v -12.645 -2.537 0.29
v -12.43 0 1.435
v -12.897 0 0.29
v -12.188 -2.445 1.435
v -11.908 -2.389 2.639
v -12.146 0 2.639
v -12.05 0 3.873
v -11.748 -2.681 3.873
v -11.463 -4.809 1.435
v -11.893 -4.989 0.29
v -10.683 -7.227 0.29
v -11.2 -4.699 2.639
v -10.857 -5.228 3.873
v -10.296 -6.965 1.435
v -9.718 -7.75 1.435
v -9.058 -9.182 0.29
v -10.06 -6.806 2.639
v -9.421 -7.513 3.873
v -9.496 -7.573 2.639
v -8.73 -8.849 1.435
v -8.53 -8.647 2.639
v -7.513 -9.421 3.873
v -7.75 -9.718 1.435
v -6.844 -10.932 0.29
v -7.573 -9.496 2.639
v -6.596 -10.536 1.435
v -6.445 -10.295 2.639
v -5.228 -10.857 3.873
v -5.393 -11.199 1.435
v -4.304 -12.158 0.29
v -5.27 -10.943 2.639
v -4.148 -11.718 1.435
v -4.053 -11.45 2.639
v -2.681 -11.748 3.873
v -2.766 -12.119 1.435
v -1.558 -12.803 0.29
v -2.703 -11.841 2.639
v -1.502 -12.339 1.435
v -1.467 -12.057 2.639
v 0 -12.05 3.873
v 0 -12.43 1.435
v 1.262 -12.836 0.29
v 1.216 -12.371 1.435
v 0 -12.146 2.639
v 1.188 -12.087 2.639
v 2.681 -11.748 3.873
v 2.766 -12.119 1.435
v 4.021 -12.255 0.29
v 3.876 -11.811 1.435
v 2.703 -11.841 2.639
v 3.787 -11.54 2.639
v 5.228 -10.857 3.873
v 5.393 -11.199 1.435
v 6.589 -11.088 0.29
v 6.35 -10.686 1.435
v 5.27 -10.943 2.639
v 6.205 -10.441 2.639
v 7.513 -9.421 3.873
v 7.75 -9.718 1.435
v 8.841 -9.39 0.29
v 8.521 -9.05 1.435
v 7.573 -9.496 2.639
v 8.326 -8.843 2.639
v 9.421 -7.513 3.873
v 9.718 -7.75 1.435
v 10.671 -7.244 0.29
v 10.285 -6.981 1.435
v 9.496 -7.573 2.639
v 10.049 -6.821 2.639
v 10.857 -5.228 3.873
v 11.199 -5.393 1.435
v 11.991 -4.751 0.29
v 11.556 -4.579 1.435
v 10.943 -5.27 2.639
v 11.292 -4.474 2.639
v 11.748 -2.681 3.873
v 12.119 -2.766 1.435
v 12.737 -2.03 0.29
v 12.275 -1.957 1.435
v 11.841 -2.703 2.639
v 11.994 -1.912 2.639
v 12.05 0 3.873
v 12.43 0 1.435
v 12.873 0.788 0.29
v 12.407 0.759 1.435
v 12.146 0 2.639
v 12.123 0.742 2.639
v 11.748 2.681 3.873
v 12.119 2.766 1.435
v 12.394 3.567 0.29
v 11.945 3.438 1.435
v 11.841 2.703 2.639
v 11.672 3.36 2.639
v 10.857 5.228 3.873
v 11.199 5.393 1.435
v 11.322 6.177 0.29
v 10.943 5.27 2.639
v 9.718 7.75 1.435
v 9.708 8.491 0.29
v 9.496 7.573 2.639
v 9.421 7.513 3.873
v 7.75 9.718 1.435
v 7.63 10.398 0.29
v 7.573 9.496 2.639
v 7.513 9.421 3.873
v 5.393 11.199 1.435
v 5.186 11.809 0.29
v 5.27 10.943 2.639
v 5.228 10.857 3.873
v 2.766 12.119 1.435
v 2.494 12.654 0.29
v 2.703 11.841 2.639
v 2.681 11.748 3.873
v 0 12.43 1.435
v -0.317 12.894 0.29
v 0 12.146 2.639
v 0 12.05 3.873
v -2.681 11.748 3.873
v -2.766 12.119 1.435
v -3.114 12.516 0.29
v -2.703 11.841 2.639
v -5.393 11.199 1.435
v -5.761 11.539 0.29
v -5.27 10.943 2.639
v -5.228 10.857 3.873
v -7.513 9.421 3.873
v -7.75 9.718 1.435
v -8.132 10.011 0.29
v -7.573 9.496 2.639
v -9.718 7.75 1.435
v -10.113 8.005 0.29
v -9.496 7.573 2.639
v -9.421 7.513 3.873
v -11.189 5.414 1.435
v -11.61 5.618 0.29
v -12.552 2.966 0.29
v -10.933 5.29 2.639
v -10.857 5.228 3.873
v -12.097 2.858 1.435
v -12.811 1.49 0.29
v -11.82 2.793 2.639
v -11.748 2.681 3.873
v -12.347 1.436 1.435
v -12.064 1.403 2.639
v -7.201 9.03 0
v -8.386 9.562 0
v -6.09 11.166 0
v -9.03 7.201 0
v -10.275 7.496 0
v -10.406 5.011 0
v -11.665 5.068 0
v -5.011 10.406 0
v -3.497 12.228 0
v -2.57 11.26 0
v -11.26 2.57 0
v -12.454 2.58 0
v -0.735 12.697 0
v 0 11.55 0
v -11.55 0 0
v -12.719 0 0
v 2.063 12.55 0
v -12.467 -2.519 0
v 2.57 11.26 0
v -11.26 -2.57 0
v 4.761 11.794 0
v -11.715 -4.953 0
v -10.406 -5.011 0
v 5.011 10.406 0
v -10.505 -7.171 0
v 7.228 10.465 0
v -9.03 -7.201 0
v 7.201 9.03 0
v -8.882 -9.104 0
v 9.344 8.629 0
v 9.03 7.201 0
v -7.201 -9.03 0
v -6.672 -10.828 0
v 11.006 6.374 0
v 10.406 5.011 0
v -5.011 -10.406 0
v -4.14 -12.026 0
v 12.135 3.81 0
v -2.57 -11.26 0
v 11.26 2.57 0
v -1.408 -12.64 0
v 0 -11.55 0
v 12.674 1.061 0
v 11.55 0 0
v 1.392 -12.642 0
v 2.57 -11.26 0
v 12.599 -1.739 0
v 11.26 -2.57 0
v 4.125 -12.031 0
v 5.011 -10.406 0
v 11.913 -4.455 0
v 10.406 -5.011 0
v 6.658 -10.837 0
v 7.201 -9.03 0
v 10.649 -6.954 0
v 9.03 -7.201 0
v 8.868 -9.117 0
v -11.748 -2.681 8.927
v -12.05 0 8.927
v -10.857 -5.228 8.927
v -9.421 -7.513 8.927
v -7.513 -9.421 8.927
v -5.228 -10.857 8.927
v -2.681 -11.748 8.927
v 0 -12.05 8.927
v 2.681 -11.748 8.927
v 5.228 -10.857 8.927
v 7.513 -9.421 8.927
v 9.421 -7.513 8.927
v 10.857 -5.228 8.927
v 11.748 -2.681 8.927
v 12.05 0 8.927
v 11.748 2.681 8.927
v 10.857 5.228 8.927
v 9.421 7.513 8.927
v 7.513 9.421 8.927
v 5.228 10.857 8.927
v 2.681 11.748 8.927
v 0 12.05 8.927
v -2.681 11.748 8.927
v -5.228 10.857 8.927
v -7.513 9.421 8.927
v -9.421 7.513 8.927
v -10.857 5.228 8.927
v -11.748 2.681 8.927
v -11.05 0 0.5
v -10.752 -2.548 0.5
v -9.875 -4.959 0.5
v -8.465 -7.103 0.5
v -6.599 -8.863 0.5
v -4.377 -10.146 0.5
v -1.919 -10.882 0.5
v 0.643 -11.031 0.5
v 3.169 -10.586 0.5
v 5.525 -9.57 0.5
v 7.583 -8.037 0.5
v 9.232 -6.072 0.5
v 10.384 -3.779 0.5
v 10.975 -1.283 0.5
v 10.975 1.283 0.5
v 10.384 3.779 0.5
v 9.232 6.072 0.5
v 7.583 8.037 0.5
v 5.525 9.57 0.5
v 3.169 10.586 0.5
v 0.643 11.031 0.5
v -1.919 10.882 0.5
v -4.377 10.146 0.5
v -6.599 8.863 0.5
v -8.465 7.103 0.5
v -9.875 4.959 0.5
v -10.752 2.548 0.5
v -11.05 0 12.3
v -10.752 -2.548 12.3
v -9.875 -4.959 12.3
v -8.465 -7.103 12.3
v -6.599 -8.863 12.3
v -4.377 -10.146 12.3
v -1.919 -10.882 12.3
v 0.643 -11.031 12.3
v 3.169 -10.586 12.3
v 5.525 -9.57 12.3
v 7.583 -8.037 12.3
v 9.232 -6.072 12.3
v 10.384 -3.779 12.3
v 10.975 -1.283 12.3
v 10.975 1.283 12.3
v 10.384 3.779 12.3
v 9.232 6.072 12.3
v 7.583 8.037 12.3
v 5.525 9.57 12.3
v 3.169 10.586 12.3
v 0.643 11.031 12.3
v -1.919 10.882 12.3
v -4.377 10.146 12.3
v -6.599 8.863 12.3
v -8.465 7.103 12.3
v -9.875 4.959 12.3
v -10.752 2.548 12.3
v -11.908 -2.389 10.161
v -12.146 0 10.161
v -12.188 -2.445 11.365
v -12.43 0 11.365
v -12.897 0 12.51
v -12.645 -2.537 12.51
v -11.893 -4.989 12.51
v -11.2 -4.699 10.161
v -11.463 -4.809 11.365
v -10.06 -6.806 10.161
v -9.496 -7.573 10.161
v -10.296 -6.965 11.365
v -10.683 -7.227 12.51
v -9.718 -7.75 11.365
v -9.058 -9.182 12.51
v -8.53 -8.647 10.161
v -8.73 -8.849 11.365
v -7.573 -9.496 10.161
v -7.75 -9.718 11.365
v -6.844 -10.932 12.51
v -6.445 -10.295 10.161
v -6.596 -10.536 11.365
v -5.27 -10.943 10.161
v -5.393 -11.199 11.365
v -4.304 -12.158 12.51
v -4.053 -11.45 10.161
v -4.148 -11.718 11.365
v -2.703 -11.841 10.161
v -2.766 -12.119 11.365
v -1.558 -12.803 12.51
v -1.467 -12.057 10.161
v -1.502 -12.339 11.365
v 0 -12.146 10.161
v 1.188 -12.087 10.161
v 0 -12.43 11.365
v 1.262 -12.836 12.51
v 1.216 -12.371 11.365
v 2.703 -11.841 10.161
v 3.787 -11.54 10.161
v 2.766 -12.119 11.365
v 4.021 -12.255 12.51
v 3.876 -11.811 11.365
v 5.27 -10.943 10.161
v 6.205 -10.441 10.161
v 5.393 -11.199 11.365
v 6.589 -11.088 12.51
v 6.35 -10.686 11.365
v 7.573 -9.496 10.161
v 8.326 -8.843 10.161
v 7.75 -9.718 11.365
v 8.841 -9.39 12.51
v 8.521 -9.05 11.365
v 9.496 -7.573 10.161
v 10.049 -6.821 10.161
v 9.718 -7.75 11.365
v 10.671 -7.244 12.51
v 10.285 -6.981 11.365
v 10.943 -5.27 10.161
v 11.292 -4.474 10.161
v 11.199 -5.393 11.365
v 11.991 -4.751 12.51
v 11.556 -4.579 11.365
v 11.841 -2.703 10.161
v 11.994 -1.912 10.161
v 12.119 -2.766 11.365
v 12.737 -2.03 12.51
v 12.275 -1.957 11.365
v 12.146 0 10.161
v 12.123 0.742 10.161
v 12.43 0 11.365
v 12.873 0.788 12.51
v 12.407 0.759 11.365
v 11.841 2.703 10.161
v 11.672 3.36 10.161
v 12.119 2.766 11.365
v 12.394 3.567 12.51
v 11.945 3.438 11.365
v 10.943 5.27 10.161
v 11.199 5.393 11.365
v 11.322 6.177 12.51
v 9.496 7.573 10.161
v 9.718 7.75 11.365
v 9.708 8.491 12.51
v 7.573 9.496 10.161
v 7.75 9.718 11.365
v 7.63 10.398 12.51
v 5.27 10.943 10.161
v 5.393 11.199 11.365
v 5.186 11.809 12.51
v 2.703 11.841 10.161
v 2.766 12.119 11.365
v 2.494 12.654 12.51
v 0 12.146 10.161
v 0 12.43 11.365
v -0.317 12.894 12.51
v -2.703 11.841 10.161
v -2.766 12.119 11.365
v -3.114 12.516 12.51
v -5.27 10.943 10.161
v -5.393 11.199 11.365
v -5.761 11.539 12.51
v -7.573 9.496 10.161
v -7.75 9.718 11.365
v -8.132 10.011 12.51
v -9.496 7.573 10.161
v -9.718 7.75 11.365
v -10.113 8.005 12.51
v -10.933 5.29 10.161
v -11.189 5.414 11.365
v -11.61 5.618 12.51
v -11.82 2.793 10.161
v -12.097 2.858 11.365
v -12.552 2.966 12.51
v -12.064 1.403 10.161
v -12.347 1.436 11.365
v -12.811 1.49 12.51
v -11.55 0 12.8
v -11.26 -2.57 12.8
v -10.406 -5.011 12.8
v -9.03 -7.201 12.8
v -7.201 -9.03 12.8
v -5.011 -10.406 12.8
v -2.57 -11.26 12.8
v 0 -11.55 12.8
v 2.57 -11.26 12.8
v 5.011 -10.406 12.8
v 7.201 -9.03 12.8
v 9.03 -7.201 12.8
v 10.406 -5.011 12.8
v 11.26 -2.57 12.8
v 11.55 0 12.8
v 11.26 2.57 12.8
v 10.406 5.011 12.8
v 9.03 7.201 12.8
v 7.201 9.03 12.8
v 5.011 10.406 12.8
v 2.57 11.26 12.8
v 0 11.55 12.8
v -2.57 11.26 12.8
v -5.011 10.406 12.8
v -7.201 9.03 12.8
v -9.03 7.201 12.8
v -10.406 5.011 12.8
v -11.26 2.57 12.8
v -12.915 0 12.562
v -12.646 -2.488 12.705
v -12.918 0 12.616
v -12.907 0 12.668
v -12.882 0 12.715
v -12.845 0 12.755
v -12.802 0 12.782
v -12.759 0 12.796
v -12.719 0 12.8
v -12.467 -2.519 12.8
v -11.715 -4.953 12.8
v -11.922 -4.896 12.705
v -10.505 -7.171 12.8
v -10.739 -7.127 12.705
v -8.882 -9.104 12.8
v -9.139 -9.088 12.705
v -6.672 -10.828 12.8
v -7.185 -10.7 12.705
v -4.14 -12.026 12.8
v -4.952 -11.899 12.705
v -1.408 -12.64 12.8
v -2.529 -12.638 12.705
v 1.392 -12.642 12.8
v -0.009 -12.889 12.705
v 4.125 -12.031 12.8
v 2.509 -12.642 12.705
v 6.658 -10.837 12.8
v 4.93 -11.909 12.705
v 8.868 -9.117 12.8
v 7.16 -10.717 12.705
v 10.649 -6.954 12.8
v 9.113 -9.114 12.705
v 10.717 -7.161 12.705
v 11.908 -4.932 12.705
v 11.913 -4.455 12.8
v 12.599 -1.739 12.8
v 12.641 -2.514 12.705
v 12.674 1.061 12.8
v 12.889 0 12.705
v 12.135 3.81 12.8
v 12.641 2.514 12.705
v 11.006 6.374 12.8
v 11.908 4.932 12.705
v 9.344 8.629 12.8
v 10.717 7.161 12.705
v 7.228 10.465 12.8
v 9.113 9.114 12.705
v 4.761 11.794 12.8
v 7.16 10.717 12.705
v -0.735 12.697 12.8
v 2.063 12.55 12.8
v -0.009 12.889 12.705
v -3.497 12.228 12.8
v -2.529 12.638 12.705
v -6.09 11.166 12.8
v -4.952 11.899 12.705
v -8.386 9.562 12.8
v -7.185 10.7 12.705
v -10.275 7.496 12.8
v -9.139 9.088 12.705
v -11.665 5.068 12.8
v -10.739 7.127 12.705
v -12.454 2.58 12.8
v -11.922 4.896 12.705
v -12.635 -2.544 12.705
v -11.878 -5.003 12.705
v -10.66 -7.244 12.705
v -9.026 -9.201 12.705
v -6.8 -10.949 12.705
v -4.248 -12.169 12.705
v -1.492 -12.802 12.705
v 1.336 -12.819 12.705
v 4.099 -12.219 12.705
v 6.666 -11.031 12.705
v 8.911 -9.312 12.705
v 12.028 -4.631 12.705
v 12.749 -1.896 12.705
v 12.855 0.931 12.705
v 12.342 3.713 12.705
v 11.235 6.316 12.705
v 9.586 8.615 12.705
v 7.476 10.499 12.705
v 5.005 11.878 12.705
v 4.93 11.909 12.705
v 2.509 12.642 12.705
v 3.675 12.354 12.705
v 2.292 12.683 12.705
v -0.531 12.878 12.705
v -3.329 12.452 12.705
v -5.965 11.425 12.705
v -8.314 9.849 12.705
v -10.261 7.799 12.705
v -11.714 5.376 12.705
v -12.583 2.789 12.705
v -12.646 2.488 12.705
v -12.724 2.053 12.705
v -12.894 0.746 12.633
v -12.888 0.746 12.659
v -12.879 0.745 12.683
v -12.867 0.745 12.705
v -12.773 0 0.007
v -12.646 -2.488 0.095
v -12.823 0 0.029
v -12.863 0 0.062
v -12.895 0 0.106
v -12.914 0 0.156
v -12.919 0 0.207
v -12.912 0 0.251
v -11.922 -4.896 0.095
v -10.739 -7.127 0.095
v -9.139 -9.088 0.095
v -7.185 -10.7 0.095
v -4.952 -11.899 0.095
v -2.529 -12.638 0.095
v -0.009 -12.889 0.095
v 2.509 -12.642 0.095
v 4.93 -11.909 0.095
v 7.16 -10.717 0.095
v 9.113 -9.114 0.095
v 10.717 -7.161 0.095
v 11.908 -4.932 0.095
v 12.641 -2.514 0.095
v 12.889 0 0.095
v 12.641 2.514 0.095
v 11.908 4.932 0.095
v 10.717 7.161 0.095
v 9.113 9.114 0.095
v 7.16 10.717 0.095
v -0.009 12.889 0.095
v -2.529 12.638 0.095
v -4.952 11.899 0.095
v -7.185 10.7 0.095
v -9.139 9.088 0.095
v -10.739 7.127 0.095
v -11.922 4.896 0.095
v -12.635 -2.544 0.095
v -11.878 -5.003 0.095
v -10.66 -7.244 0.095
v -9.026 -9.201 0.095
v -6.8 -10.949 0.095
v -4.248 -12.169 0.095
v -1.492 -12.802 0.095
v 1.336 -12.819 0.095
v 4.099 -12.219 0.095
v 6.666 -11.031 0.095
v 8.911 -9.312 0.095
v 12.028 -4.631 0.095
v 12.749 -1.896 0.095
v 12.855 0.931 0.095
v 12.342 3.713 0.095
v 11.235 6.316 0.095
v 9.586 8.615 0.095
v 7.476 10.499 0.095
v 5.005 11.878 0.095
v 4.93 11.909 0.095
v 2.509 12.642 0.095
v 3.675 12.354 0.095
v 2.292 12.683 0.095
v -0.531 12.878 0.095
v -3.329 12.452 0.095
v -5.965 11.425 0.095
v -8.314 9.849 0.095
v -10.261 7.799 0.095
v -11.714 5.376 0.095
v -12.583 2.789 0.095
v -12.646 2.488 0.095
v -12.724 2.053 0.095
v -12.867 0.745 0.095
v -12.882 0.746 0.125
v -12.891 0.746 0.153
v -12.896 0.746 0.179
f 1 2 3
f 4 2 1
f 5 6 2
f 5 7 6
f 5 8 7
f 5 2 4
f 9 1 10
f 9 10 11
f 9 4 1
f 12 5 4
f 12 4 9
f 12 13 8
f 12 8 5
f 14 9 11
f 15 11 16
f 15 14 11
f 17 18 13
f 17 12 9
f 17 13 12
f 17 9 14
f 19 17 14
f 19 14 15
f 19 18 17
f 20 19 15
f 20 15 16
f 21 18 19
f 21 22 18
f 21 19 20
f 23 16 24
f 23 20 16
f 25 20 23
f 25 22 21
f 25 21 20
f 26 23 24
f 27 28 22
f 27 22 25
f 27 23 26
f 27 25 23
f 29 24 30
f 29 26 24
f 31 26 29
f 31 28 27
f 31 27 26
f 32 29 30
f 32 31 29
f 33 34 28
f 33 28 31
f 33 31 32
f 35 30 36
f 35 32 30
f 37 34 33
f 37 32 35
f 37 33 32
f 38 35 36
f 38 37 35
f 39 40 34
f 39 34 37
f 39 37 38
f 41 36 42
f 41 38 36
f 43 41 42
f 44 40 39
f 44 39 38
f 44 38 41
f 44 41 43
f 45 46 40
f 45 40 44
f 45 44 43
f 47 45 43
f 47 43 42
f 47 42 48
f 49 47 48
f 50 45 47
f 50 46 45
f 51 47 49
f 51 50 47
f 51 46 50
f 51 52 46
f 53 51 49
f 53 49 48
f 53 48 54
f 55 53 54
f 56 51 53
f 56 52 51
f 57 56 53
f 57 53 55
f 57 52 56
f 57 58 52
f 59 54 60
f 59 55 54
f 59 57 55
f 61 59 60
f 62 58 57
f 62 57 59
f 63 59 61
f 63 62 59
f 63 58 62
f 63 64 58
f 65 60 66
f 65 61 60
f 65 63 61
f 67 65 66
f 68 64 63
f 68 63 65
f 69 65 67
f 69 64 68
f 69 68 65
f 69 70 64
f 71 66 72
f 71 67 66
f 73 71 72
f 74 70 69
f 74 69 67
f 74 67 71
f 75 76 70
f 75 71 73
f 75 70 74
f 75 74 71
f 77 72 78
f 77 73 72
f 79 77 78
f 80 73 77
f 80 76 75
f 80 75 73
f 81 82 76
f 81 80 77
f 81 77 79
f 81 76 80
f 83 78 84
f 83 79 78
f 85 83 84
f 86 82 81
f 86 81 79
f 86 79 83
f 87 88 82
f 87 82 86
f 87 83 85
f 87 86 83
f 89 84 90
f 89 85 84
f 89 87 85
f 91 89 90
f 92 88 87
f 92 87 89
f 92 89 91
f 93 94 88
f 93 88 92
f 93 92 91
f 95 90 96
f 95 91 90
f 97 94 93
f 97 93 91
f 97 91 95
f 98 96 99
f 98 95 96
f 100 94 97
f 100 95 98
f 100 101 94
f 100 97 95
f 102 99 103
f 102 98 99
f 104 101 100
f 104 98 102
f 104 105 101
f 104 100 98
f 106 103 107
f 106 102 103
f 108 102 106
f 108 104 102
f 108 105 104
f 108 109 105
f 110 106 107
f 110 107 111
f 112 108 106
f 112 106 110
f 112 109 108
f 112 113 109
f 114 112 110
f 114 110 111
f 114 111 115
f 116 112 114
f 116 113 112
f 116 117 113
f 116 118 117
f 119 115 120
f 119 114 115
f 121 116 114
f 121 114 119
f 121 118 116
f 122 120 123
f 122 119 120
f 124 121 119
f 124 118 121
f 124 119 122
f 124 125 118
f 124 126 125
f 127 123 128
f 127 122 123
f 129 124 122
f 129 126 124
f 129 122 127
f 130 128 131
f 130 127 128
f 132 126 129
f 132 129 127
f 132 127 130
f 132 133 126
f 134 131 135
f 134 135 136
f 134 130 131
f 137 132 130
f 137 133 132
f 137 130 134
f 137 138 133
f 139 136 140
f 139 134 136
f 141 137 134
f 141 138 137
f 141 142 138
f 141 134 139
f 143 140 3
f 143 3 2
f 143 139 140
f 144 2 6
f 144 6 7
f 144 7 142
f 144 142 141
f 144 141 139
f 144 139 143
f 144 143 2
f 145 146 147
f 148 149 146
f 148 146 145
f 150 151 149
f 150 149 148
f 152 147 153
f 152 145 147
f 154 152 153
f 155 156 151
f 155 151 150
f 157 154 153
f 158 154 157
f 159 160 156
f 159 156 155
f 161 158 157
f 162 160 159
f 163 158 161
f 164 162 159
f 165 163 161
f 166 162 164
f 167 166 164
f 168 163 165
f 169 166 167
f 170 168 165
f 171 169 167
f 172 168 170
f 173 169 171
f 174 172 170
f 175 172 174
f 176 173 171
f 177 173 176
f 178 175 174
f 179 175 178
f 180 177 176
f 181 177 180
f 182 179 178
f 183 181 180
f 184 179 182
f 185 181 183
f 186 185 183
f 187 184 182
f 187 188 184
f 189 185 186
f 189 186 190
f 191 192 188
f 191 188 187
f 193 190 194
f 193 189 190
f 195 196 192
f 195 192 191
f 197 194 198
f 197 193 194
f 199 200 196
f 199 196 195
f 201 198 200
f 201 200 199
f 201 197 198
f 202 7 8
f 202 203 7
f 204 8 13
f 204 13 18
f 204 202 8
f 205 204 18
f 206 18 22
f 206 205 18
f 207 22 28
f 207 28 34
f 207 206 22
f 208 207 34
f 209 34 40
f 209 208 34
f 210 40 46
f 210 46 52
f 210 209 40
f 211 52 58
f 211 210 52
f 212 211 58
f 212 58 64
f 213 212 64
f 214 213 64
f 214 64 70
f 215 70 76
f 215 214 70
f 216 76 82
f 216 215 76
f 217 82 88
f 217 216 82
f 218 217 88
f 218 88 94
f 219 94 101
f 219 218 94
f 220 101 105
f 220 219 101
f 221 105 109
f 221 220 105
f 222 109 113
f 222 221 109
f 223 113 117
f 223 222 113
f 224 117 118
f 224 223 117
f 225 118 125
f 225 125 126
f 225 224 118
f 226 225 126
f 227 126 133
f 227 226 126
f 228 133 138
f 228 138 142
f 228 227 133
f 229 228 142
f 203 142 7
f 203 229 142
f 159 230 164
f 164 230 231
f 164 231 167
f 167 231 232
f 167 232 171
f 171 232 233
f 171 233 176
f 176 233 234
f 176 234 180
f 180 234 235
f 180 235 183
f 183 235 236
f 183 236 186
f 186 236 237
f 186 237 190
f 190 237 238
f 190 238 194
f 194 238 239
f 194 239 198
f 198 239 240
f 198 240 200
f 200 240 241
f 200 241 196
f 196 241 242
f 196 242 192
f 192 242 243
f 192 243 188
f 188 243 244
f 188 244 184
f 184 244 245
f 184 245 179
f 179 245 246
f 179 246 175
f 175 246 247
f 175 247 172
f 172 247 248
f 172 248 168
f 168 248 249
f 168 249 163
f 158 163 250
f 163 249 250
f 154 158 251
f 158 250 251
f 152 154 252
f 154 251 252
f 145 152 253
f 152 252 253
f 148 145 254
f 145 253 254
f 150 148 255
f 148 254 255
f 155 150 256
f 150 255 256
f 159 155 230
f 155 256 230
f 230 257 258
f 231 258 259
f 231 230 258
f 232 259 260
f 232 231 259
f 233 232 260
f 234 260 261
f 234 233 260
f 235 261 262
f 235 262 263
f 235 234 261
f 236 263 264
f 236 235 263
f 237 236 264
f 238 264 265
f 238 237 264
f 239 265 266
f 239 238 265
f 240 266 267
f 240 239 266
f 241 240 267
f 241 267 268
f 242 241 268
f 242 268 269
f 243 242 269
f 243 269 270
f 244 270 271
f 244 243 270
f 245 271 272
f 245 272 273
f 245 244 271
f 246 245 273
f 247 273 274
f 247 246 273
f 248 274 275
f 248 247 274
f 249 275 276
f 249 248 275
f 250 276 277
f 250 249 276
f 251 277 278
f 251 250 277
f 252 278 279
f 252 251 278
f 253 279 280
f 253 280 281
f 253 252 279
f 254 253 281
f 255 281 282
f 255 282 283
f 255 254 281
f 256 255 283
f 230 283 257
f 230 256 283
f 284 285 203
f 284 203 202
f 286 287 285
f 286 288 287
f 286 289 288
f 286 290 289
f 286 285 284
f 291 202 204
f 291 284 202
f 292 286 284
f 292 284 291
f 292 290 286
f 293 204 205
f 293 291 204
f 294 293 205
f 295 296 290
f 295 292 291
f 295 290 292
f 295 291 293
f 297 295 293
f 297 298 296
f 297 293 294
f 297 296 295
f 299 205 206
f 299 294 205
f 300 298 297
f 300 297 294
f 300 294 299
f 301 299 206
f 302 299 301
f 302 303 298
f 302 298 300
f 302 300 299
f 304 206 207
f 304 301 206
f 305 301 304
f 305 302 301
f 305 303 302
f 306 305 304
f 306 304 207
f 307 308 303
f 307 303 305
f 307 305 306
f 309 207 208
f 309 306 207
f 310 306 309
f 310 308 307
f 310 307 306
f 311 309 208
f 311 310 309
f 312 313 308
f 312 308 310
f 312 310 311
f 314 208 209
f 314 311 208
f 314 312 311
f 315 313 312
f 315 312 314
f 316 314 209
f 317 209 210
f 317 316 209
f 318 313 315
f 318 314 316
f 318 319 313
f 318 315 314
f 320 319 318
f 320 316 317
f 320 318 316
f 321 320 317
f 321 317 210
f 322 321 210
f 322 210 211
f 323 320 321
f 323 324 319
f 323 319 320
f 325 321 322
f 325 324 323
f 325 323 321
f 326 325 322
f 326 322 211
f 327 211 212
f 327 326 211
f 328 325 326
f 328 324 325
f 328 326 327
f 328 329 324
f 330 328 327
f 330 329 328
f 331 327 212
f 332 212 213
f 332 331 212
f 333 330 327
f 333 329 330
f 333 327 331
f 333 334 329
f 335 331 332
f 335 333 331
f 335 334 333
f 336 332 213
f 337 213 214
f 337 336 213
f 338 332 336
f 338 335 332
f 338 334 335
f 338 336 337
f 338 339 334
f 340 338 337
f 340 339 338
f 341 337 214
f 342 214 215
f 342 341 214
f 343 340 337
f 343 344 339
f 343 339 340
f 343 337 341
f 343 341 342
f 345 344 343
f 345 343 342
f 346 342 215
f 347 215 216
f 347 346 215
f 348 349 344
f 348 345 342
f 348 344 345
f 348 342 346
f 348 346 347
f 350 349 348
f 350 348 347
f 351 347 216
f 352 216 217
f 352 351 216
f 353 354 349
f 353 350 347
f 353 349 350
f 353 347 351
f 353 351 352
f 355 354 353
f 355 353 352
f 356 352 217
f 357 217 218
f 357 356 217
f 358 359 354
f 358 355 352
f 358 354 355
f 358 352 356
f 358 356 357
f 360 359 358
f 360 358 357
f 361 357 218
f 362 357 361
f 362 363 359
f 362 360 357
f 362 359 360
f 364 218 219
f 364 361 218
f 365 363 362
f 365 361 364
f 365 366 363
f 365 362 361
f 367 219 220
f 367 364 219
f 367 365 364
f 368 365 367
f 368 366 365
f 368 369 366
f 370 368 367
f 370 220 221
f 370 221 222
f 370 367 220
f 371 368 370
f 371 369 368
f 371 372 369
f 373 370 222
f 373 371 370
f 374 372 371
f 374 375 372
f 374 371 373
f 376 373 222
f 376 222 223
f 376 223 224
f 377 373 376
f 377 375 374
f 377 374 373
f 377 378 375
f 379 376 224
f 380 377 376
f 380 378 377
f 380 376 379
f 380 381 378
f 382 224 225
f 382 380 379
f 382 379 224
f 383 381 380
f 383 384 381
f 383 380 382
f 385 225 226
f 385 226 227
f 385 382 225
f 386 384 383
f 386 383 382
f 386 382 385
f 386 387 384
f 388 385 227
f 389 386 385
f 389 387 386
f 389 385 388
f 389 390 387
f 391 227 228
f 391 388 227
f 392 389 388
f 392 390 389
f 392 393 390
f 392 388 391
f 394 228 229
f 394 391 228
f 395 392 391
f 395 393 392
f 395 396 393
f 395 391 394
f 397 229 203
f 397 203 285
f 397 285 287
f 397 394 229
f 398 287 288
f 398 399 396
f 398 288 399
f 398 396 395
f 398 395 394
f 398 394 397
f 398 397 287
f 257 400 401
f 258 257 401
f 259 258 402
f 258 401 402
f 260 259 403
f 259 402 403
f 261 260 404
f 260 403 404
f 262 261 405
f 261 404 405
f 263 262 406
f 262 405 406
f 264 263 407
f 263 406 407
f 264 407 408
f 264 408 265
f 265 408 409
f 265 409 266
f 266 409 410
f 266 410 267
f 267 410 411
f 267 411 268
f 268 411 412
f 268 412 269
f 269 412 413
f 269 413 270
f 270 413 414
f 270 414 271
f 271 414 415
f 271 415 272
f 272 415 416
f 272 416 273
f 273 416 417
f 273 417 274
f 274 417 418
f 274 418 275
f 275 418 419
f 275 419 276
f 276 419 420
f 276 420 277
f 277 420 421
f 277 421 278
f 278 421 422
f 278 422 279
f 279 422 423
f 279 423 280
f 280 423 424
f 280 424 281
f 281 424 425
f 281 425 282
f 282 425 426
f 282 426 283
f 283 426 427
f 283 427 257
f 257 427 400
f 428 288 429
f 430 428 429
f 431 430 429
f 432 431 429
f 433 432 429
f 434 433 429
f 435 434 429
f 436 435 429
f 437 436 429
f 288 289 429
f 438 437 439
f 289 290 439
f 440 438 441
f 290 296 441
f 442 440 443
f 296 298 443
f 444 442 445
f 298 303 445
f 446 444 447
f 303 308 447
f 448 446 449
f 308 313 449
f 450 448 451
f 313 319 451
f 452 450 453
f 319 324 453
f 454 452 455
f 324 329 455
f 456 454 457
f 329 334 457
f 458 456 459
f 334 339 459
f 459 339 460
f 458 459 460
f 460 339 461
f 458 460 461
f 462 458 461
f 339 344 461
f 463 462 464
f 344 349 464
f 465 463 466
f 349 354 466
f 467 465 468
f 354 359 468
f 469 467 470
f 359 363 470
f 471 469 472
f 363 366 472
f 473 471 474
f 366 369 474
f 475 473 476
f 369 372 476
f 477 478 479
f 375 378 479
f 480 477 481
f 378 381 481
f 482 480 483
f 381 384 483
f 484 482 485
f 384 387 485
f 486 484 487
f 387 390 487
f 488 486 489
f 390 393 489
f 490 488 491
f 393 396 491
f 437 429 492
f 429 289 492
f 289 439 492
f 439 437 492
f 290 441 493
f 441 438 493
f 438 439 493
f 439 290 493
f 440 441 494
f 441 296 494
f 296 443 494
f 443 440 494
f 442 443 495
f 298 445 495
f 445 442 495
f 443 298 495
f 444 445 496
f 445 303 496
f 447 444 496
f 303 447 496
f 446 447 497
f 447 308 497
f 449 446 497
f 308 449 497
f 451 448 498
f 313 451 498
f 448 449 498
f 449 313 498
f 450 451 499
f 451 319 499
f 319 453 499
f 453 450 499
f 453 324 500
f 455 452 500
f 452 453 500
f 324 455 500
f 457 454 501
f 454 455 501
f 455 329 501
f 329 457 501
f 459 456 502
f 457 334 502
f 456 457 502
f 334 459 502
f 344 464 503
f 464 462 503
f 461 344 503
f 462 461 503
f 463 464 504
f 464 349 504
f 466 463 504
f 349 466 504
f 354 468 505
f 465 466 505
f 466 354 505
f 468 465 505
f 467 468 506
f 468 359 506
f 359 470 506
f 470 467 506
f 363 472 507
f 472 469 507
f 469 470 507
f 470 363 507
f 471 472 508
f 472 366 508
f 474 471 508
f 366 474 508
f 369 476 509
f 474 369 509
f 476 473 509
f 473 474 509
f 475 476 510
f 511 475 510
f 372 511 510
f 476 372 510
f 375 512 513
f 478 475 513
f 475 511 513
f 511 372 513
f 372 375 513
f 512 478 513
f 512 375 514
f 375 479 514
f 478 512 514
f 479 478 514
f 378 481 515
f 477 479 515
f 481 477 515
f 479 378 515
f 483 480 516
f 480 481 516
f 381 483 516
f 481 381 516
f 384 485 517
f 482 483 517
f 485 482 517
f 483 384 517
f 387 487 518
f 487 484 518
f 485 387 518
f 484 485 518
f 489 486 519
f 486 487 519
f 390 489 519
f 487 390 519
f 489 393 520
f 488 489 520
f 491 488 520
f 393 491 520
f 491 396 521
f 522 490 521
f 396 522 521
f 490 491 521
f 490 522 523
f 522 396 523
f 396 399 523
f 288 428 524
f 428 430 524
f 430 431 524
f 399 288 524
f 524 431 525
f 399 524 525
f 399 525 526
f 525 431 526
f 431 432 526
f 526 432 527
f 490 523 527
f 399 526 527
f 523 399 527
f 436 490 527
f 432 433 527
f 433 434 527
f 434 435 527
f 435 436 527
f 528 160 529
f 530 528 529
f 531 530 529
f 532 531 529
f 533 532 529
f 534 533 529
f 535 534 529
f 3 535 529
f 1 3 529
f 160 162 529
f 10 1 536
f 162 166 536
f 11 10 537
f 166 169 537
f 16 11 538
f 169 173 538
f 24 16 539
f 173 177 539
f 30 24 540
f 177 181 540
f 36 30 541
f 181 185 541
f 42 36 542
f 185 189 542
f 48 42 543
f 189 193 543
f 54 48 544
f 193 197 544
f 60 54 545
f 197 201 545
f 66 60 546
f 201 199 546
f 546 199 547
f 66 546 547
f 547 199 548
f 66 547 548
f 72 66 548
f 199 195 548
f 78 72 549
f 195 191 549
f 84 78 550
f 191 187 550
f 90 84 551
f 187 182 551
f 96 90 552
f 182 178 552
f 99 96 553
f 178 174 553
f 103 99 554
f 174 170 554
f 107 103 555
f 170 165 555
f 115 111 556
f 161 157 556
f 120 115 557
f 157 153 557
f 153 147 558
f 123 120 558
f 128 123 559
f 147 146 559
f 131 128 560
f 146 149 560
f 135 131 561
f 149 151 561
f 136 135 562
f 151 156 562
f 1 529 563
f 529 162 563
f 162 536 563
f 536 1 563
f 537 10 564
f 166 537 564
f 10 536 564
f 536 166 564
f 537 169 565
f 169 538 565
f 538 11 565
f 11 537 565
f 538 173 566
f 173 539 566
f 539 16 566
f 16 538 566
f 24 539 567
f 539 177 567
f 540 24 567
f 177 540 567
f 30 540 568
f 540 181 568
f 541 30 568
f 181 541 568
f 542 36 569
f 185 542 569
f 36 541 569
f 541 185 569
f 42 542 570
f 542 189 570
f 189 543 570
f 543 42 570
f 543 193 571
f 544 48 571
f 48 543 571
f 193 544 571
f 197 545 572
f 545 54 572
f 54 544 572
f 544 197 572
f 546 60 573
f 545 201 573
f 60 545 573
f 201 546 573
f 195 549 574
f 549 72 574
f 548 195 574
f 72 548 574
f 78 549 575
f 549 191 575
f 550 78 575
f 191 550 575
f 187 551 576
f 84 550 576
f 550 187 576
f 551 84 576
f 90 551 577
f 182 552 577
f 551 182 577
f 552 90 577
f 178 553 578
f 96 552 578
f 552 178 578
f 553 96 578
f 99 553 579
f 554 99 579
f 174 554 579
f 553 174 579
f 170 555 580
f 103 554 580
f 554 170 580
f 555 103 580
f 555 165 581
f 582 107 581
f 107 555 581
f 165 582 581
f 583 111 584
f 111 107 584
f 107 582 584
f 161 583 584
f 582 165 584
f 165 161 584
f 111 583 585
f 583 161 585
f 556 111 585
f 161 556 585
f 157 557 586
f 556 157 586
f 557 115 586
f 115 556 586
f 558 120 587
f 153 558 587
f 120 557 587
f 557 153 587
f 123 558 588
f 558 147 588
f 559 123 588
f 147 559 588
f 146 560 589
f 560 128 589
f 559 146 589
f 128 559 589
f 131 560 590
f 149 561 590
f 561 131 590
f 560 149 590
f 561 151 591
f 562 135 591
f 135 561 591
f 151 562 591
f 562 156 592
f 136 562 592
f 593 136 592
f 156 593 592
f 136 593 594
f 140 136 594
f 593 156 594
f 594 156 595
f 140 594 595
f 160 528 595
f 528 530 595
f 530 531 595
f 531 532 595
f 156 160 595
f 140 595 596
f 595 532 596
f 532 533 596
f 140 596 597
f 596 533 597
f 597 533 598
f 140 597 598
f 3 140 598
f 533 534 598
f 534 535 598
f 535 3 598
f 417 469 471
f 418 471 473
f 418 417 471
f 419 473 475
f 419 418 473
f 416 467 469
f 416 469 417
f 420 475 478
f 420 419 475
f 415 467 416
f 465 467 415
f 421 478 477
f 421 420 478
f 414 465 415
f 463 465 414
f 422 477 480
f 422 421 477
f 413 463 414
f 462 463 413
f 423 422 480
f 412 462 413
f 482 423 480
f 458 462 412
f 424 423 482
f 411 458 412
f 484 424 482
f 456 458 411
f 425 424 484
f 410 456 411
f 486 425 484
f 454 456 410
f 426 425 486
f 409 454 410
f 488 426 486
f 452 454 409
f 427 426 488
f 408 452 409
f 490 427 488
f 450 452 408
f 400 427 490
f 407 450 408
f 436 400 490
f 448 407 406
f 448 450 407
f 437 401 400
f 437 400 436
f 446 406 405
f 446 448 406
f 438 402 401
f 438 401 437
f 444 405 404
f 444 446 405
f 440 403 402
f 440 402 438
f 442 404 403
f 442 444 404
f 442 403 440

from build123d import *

# Parameters (mm, degrees)
FILLET_R     = 0.2
CHAMFER_SIZE = 0.5


with BuildPart() as part:
    # Sketch001 → Revolution (revolve)
    with BuildSketch(Plane.XZ):
        with BuildLine():
            Line((-11.05, 12.8), (-11.05, 0))
            Line((-11.05, 0), (-13.05, 0))
            ThreePointArc((-13.05, 0), (-12.304033, 1.872983), (-12.05, 3.872983))
            Line((-12.05, 3.872983), (-12.05, 8.927017))
            ThreePointArc((-12.05, 8.927017), (-12.304033, 10.927017), (-13.05, 12.8))
            Line((-13.05, 12.8), (-11.05, 12.8))
        make_face()
    revolve(axis=Axis((0, 0, 0), (0, 0, 1)))

    # Fillet
    fillet_edges = [part.edges().sort_by_distance(p)[0] for p in [
        (13.05, 0, 12.8),
        (13.05, 0, 0),
    ]]
    fillet(fillet_edges, radius=FILLET_R)

    # Chamfer
    chamfer_edges = [part.edges().sort_by_distance(p)[0] for p in [
        (11.05, 0, 0),
        (11.05, 0, 12.8),
    ]]
    chamfer(chamfer_edges, length=CHAMFER_SIZE)


solid = part.part
